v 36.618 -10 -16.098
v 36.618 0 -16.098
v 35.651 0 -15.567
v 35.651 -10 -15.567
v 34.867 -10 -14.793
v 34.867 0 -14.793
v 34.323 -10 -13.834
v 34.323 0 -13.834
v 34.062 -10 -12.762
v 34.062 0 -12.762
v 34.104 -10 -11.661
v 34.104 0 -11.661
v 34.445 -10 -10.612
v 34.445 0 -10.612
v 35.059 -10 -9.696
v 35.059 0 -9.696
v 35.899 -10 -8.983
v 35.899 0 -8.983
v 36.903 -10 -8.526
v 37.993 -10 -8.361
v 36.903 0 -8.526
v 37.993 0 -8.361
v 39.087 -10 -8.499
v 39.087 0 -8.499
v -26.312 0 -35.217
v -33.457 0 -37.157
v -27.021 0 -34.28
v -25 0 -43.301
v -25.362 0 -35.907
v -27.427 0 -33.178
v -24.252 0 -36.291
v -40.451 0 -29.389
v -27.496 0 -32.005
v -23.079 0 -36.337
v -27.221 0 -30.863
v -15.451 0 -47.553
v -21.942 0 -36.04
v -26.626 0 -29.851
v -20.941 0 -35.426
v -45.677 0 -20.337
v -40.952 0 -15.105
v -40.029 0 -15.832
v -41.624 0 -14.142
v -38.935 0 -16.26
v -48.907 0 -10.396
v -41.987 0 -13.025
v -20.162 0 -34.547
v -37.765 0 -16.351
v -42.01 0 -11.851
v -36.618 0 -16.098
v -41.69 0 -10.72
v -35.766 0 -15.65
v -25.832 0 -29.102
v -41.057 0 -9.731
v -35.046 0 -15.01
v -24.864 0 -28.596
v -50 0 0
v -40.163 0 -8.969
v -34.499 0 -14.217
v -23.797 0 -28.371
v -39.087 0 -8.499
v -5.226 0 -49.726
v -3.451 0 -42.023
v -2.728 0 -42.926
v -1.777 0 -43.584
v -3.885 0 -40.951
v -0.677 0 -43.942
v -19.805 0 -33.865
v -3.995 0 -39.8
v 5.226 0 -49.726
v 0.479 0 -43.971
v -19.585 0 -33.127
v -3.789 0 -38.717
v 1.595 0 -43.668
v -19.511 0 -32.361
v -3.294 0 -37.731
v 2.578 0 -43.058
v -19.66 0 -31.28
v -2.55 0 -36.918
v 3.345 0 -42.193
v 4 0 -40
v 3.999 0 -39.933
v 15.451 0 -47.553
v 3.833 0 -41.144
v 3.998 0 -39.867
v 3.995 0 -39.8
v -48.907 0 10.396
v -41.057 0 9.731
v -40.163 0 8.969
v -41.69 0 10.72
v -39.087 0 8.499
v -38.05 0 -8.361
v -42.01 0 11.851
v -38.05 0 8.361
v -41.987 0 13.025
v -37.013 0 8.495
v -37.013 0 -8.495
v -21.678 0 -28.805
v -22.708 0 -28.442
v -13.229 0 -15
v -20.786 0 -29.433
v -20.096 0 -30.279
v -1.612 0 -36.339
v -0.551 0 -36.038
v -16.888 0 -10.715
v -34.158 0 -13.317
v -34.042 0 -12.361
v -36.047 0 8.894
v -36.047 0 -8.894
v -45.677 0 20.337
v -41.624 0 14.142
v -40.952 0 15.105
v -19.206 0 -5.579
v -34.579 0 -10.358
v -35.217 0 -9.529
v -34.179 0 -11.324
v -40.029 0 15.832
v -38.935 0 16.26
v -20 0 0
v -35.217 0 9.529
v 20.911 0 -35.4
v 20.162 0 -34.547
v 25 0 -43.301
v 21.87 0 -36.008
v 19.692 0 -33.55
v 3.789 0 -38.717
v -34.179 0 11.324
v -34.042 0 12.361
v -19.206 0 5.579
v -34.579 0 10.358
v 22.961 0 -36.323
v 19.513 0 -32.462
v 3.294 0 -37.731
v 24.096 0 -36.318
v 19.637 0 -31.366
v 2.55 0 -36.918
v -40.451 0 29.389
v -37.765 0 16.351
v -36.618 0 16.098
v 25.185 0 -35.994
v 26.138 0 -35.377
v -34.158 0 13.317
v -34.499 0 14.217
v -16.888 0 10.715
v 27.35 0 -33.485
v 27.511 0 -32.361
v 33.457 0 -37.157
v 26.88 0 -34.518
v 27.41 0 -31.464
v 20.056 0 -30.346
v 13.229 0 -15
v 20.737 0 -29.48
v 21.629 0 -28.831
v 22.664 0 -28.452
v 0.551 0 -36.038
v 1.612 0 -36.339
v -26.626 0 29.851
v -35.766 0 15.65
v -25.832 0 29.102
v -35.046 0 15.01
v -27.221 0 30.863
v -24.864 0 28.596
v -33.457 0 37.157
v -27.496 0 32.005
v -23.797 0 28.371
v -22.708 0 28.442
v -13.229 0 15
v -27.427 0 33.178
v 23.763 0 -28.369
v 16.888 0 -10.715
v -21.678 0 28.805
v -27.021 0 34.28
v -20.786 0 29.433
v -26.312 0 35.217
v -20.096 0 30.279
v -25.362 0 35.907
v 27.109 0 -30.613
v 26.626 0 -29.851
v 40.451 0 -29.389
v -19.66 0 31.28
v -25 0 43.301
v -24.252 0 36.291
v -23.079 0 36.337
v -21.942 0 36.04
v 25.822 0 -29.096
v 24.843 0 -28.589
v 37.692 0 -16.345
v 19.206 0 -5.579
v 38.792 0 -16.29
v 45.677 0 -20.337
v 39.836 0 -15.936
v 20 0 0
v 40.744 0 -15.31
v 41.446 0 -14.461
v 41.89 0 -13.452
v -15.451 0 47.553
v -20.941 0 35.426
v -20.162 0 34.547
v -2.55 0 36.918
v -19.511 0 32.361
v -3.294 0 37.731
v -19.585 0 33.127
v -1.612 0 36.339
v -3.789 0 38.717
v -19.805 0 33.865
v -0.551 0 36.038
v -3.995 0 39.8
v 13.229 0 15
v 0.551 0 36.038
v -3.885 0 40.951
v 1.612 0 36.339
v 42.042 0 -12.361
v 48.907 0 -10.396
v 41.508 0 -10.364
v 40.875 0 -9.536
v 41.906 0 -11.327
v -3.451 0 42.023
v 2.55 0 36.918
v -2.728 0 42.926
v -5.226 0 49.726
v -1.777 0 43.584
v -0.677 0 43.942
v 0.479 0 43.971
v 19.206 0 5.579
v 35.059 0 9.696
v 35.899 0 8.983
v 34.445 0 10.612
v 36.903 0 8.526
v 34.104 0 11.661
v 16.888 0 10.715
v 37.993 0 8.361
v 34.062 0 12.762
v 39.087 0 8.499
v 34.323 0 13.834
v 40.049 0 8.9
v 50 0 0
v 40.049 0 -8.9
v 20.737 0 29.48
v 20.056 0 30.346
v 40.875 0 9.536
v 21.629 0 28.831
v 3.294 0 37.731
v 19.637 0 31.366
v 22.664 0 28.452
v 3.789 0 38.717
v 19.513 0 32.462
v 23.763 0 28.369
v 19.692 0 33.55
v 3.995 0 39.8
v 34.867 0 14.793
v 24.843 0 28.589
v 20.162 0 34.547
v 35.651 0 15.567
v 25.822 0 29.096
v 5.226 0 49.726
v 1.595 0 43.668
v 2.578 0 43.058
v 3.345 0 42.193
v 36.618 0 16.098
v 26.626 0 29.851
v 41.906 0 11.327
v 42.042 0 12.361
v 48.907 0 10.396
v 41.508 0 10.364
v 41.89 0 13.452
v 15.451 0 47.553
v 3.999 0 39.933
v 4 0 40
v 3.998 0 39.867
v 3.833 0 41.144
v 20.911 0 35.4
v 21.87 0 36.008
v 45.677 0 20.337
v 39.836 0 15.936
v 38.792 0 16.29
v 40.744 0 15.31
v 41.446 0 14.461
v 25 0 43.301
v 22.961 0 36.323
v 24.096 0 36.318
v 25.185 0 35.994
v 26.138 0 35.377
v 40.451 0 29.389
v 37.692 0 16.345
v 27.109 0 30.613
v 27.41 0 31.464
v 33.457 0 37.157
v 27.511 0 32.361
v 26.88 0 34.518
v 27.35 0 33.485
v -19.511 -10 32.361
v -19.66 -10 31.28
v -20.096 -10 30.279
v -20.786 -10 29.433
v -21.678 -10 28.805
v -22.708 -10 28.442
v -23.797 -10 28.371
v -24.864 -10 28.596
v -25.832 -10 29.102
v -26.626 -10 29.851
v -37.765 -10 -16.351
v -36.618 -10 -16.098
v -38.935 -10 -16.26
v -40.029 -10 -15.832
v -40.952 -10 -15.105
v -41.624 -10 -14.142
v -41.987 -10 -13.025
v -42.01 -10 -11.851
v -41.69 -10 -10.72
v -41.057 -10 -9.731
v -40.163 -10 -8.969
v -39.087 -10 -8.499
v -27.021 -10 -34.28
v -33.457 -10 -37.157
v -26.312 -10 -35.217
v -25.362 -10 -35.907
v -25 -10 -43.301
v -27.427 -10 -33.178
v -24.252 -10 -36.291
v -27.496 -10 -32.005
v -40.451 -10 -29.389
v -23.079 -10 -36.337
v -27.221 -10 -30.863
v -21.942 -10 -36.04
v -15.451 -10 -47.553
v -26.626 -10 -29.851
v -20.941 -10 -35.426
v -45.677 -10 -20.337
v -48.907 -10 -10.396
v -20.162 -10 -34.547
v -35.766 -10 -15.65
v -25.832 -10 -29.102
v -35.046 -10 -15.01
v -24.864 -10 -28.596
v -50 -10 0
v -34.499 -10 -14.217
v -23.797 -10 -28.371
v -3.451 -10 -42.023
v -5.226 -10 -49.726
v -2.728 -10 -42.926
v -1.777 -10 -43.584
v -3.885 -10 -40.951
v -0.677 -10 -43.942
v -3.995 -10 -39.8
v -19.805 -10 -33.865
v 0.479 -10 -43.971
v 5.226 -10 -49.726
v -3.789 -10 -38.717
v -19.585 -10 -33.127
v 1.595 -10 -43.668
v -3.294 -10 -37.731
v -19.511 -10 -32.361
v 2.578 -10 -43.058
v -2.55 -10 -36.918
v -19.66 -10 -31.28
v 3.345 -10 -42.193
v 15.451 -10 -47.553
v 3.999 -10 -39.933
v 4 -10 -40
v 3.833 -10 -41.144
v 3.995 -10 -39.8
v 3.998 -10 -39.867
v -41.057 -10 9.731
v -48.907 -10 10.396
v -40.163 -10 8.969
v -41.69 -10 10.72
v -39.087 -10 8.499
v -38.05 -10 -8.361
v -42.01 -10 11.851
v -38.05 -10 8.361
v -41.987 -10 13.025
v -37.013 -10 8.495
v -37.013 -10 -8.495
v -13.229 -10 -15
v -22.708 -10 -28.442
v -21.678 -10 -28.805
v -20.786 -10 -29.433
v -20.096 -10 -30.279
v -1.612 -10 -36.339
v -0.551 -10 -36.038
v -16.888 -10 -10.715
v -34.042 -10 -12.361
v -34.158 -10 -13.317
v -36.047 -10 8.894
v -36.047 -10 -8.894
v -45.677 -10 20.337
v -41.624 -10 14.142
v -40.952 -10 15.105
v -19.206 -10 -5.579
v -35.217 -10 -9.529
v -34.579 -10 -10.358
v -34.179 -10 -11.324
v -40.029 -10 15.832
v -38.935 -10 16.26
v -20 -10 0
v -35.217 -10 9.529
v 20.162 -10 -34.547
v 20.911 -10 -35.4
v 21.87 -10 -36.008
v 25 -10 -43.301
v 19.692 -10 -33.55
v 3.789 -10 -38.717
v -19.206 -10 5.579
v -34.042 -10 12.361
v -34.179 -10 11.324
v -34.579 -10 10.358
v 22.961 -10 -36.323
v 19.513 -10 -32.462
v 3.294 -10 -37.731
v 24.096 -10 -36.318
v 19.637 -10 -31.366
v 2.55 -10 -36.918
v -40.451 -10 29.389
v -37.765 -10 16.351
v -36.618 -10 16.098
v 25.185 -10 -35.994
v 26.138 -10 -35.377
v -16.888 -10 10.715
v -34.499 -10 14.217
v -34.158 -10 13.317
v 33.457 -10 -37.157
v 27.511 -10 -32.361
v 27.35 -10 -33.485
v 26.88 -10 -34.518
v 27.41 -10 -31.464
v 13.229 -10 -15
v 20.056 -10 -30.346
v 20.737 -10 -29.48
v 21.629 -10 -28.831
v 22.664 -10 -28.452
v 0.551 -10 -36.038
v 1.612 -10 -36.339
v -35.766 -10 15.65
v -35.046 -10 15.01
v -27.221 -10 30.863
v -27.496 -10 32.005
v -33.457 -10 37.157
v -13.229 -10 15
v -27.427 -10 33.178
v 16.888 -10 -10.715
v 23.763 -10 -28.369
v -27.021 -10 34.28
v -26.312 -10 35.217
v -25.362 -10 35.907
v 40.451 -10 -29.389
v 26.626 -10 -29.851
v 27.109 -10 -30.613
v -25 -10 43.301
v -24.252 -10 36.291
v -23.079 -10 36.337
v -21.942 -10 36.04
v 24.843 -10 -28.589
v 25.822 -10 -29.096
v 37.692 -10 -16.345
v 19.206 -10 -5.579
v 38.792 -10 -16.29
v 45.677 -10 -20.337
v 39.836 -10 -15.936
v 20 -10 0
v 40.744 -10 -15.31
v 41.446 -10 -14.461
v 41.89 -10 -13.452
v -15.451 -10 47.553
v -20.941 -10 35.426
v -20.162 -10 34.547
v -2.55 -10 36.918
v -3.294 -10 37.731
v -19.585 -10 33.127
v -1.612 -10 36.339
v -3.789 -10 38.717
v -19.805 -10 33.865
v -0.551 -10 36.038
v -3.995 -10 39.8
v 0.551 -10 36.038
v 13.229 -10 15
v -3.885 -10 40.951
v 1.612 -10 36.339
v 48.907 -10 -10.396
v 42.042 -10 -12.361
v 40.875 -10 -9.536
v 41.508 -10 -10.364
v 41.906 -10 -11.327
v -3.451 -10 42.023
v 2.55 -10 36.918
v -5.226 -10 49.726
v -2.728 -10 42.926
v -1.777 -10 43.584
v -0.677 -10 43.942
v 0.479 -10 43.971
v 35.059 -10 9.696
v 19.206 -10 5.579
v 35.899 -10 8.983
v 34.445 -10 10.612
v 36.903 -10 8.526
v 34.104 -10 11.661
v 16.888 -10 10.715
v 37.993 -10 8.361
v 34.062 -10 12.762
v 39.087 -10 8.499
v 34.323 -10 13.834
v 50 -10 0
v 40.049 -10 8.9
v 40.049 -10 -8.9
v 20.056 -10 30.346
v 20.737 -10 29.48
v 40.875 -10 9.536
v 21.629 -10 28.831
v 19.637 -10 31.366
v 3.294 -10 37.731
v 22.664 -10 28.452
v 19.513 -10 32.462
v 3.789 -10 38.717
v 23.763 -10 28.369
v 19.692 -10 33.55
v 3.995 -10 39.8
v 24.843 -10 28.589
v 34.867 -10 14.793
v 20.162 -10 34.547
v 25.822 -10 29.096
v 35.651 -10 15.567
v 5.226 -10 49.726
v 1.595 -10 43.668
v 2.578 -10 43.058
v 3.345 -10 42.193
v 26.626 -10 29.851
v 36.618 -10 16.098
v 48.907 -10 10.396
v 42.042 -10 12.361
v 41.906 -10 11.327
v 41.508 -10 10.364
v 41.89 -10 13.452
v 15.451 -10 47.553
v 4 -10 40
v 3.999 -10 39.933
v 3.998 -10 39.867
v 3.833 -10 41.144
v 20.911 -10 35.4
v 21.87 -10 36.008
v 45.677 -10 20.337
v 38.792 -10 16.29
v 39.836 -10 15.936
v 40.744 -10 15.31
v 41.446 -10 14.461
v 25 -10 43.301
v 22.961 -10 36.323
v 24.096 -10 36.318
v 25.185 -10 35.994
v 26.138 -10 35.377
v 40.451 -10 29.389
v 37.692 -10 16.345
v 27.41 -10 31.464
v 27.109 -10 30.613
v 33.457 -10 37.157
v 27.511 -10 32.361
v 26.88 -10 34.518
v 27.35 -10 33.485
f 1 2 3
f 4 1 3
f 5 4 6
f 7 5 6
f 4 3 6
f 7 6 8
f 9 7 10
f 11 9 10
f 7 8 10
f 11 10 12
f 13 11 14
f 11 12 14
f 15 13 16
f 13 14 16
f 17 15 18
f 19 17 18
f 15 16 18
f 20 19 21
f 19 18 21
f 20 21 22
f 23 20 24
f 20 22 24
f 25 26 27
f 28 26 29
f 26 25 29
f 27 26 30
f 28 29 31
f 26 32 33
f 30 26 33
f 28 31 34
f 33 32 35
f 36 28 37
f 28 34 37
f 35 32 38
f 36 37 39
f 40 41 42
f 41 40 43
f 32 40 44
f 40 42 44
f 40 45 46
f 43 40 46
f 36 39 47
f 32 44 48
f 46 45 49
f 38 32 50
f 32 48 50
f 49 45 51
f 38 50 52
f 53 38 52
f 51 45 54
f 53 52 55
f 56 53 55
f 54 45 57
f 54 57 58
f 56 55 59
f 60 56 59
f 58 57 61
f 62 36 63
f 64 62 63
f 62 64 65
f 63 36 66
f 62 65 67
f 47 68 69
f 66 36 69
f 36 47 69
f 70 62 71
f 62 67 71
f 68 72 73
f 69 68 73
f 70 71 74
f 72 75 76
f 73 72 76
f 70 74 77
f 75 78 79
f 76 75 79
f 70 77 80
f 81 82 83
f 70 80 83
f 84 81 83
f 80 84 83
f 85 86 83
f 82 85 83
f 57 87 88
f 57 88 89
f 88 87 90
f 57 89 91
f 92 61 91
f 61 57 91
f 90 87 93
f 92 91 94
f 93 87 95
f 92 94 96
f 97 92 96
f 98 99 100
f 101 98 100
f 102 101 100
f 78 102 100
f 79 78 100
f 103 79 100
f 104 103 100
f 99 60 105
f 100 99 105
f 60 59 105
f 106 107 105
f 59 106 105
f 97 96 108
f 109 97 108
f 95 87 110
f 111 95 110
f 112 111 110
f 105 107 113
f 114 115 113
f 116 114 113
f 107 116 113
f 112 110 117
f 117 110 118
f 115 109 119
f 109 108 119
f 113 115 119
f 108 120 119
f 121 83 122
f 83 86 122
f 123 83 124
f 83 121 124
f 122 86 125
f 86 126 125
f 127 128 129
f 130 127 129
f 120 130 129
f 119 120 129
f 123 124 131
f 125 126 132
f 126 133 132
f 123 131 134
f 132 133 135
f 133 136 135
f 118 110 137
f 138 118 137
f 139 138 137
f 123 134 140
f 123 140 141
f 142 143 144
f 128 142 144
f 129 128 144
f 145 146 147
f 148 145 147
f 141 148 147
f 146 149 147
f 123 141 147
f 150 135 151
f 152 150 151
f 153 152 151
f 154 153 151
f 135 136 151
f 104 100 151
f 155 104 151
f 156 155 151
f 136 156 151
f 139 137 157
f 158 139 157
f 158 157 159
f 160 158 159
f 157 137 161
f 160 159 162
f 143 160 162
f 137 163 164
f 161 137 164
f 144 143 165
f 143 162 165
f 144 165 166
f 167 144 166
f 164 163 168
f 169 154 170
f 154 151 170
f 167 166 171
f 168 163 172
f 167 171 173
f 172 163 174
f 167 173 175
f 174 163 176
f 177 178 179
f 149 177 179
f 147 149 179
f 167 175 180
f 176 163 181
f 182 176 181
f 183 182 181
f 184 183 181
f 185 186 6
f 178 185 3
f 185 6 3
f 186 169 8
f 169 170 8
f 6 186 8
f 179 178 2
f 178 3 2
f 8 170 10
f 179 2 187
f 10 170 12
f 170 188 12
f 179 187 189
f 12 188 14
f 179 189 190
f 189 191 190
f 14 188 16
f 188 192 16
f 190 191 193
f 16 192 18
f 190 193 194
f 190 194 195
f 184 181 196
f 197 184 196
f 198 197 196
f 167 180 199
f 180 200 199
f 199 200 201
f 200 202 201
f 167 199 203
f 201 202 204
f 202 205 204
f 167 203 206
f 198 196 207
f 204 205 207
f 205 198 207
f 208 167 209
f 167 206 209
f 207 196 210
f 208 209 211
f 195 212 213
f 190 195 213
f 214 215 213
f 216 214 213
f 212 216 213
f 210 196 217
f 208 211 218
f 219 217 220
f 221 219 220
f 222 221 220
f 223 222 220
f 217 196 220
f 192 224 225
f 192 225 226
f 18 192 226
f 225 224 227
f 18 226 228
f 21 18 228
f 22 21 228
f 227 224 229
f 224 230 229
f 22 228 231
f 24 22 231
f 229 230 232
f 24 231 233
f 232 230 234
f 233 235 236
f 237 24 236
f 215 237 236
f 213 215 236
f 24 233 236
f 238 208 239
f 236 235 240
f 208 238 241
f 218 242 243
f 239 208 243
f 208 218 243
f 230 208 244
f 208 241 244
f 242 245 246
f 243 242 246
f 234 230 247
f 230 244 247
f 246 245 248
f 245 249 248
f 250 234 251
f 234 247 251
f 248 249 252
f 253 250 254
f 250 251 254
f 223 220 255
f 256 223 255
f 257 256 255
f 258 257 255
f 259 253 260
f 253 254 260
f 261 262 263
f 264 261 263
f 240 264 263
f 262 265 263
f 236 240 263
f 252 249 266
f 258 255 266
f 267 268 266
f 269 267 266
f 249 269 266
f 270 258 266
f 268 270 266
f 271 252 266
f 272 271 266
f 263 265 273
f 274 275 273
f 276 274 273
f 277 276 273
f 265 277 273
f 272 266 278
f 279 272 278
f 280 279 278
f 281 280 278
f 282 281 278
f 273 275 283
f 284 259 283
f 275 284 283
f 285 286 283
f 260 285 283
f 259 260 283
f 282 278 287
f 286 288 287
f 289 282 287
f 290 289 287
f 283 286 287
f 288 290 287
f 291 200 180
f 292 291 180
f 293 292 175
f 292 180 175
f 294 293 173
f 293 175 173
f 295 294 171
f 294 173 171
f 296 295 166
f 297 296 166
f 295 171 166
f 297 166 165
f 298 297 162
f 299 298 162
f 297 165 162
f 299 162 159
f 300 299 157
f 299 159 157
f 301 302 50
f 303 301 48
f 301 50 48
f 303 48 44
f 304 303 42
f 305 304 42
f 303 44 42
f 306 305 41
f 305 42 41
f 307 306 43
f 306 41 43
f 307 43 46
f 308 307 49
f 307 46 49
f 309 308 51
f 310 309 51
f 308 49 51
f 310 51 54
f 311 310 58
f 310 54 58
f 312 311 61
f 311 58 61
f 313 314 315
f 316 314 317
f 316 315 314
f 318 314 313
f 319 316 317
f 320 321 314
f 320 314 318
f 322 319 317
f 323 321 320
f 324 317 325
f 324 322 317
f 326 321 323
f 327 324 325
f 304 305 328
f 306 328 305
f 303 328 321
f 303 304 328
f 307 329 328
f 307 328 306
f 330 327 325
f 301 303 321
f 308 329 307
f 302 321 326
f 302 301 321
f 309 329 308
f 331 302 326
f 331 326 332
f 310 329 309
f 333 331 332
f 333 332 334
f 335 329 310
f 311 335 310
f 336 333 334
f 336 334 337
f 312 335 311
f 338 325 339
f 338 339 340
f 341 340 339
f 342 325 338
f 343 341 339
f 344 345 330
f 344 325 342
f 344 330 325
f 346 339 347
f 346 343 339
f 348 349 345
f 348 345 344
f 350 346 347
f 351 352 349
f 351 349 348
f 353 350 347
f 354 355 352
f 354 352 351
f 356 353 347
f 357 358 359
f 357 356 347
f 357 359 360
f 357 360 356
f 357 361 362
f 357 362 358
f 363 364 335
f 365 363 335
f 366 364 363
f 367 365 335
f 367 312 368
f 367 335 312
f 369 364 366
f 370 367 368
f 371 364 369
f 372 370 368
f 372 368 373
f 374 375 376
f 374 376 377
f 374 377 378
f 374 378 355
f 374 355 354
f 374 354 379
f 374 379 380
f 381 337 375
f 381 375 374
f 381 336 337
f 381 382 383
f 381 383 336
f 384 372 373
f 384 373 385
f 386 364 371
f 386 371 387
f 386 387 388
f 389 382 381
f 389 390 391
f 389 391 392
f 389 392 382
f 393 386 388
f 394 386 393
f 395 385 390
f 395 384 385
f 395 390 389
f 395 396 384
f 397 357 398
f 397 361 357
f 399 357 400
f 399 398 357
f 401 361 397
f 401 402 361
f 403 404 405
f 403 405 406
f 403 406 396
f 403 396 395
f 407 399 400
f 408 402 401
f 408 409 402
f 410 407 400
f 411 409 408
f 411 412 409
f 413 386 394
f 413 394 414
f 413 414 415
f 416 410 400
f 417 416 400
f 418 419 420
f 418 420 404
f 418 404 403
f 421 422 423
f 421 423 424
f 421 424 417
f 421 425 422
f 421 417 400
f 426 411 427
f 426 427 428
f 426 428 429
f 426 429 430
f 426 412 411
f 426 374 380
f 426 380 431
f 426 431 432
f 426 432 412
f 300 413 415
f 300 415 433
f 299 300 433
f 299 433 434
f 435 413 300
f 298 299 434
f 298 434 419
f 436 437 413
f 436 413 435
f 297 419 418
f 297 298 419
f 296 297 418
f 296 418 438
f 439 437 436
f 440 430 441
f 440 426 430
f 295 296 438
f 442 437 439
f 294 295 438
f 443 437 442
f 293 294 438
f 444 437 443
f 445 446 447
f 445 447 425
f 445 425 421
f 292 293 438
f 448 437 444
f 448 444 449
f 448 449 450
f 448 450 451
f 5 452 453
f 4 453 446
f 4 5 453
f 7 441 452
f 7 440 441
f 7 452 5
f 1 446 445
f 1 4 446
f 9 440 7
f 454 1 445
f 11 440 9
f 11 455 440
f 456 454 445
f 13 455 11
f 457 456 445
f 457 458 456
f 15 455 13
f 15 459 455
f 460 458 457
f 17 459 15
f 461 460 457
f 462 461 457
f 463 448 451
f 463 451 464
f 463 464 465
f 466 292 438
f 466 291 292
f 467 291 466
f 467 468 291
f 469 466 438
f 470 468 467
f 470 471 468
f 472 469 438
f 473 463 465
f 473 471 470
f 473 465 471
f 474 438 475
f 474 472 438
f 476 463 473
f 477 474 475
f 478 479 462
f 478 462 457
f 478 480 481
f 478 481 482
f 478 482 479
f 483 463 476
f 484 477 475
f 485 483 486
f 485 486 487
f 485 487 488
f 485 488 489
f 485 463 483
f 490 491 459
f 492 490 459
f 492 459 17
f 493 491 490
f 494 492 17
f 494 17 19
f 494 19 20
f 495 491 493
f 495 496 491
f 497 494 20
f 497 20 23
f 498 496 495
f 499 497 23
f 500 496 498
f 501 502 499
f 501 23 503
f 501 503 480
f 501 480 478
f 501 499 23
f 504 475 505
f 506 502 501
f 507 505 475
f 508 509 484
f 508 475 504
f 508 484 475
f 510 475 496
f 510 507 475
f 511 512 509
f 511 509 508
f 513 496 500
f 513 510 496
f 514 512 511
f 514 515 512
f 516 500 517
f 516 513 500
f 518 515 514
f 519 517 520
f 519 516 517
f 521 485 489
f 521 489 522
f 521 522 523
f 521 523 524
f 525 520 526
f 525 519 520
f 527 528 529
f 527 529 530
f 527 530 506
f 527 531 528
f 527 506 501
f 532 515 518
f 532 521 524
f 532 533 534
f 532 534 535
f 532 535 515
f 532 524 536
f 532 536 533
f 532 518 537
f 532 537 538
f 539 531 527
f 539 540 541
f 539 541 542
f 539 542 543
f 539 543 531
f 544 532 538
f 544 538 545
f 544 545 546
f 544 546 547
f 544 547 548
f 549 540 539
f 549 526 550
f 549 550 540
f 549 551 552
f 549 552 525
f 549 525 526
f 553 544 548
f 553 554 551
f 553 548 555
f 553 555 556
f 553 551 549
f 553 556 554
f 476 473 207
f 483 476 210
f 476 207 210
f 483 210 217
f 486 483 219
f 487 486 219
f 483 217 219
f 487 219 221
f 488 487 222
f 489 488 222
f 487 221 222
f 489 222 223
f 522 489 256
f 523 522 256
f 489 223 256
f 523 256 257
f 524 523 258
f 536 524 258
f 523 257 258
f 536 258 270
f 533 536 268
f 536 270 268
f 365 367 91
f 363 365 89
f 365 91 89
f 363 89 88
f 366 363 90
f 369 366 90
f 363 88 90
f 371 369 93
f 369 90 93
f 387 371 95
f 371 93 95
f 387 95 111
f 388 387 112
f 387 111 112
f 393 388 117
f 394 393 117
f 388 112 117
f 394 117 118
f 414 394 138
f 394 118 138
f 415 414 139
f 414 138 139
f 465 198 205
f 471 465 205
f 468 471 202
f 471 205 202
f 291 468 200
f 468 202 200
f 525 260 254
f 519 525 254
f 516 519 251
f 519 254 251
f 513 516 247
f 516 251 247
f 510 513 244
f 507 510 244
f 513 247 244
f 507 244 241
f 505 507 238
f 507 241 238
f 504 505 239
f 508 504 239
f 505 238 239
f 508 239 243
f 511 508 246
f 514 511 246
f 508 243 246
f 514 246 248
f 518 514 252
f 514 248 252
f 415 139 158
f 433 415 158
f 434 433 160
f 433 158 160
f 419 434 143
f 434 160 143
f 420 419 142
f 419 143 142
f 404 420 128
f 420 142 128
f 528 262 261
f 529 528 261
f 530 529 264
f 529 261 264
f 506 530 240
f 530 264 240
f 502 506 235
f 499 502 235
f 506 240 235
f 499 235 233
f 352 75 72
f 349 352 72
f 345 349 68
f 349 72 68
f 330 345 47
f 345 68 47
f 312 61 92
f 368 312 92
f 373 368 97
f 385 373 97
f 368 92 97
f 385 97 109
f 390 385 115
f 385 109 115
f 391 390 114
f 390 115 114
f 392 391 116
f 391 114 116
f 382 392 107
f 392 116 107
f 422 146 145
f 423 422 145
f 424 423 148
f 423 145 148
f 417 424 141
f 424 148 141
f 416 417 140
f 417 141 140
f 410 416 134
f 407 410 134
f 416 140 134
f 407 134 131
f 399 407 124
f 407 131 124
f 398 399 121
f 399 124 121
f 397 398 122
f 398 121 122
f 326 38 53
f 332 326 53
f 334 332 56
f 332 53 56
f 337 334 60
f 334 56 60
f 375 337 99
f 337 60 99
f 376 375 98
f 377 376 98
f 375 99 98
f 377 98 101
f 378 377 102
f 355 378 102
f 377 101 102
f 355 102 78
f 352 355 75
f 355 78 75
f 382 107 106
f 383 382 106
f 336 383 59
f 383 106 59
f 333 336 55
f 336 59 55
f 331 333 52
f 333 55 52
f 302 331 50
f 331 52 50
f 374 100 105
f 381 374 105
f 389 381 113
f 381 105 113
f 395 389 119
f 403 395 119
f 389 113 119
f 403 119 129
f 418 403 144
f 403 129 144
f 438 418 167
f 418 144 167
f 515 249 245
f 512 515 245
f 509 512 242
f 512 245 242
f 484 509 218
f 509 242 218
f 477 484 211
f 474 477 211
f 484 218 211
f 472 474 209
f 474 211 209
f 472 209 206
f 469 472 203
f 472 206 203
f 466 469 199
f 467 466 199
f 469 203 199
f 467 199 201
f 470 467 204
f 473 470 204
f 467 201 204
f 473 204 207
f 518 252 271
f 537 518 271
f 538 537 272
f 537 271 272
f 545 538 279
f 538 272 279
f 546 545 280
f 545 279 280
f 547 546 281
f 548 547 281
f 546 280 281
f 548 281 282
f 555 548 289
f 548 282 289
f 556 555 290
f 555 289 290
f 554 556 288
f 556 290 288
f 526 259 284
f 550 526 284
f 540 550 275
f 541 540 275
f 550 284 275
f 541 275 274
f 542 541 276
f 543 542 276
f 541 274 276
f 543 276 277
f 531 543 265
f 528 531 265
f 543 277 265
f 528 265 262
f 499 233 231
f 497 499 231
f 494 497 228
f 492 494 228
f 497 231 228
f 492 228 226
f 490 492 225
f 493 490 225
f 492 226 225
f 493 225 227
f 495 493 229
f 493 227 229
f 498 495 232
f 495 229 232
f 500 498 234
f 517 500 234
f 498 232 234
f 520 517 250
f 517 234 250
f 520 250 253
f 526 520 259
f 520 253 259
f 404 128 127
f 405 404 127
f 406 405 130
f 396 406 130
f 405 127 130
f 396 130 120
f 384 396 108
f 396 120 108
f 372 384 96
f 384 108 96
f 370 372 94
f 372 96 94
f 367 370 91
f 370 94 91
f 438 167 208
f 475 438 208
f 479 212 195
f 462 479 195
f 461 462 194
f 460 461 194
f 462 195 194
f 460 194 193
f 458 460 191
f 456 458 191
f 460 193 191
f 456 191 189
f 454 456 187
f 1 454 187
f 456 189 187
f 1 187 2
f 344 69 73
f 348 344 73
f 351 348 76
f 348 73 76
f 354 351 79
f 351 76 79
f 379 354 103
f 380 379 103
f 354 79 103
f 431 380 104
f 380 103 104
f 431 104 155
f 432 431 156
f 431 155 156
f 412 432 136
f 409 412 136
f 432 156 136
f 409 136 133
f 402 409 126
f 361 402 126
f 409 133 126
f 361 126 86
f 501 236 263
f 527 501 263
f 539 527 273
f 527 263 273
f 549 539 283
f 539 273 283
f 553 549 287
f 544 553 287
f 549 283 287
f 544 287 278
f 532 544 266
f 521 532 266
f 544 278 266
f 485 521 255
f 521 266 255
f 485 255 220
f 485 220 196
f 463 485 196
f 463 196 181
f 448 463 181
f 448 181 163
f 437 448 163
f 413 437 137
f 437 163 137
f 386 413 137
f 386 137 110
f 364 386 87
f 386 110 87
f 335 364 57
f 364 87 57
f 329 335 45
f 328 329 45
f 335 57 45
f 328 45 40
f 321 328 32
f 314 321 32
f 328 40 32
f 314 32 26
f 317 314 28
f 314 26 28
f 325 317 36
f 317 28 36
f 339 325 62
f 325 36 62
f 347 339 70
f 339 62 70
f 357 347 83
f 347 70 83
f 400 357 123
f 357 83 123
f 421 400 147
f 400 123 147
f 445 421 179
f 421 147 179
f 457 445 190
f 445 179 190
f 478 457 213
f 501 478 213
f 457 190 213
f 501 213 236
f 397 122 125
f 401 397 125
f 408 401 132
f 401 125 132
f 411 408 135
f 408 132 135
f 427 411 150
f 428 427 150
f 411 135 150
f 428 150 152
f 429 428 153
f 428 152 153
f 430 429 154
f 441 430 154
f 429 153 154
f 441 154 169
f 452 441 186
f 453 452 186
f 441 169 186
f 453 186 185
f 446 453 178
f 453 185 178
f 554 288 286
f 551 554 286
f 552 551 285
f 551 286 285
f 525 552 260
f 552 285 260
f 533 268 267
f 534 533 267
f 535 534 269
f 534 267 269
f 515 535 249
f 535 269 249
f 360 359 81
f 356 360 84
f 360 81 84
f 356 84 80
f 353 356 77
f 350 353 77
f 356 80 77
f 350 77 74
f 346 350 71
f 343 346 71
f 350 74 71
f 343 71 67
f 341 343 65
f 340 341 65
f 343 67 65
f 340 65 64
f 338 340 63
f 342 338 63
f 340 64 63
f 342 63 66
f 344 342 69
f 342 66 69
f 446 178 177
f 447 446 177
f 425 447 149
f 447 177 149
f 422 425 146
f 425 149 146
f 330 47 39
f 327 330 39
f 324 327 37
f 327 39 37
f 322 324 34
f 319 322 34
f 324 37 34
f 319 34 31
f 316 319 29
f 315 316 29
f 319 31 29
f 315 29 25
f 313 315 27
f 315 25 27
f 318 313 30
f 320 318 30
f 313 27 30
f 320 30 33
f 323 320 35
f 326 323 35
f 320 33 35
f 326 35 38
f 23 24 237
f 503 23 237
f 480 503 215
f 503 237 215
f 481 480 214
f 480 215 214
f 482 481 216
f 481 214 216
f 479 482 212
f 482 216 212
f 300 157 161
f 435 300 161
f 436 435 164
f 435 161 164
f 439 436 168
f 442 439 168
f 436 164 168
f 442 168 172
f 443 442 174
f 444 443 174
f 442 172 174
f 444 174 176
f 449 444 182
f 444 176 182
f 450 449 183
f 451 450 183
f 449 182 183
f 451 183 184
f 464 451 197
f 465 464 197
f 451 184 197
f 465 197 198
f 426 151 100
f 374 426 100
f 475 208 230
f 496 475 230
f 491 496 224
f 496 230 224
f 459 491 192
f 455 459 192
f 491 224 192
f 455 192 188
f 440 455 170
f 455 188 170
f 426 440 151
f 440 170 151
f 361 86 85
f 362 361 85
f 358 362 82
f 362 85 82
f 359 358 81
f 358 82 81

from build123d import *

# Parameters (mm, degrees)
F0_R     = 50
F0_R_2   = 25
F1_DEPTH = 10


with BuildPart() as f1:
    # F0 (on Front) → F1 (new body)
    with BuildSketch(Plane.XZ):
        Circle(F0_R)
        with BuildLine():
            ThreePointArc((-20.1618326801, 34.5470766199), (-12.360679775, 38.0422606518), (-3.9949968711, 39.8))
            ThreePointArc((-3.9949968711, 39.8), (-0.1000312842, 43.9987490222), (4, 40))
            ThreePointArc((4, 40), (3.9987490222, 39.8999687158), (3.9949968711, 39.8))
            ThreePointArc((3.9949968711, 39.8), (12.360679775, 38.0422606518), (20.1618326801, 34.5470766199))
            ThreePointArc((20.1618326801, 34.5470766199), (24.6519560911, 36.1946274563), (27.5114100917, 32.360679775))
            ThreePointArc((27.5114100917, 32.360679775), (27.2835350395, 31.0298629662), (26.6258734024, 29.8506761323))
            ThreePointArc((26.6258734024, 29.8506761323), (32.360679775, 23.5114100917), (36.6175274229, 16.0983441829))
            ThreePointArc((36.6175274229, 16.0983441829), (40.3117393457, 15.6545326038), (42.0422606518, 12.360679775))
            ThreePointArc((42.0422606518, 12.360679775), (41.2185196533, 9.9293470632), (39.0865712742, 8.4994085693))
            ThreePointArc((39.0865712742, 8.4994085693), (40, 0), (39.0865712742, -8.4994085693))
            ThreePointArc((39.0865712742, -8.4994085693), (41.2185196533, -9.9293470632), (42.0422606518, -12.360679775))
            ThreePointArc((42.0422606518, -12.360679775), (40.3117393457, -15.6545326038), (36.6175274229, -16.0983441829))
            ThreePointArc((36.6175274229, -16.0983441829), (32.360679775, -23.5114100917), (26.6258734024, -29.8506761323))
            ThreePointArc((26.6258734024, -29.8506761323), (27.2835350395, -31.0298629662), (27.5114100917, -32.360679775))
            ThreePointArc((27.5114100917, -32.360679775), (24.6519560911, -36.1946274563), (20.1618326801, -34.5470766199))
            ThreePointArc((20.1618326801, -34.5470766199), (12.360679775, -38.0422606518), (3.9949968711, -39.8))
            ThreePointArc((3.9949968711, -39.8), (3.9987490222, -39.8999687158), (4, -40))
            ThreePointArc((4, -40), (-0.1000312842, -43.9987490222), (-3.9949968711, -39.8))
            ThreePointArc((-3.9949968711, -39.8), (-12.360679775, -38.0422606518), (-20.1618326801, -34.5470766199))
            ThreePointArc((-20.1618326801, -34.5470766199), (-25.8625511009, -35.5967477525), (-26.6258734024, -29.8506761323))
            ThreePointArc((-26.6258734024, -29.8506761323), (-32.360679775, -23.5114100917), (-36.6175274229, -16.0983441829))
            ThreePointArc((-36.6175274229, -16.0983441829), (-41.846486717, -13.5967477525), (-39.0865712742, -8.4994085693))
            ThreePointArc((-39.0865712742, -8.4994085693), (-40, 0), (-39.0865712742, 8.4994085693))
            ThreePointArc((-39.0865712742, 8.4994085693), (-41.846486717, 13.5967477525), (-36.6175274229, 16.0983441829))
            ThreePointArc((-36.6175274229, 16.0983441829), (-32.360679775, 23.5114100917), (-26.6258734024, 29.8506761323))
            ThreePointArc((-26.6258734024, 29.8506761323), (-25.8625511009, 35.5967477525), (-20.1618326801, 34.5470766199))
        make_face(mode=Mode.SUBTRACT)
        with BuildLine():
            ThreePointArc((3.9949968711, 39.8), (0, 36), (-3.9949968711, 39.8))
            ThreePointArc((-3.9949968711, 39.8), (-12.360679775, 38.0422606518), (-20.1618326801, 34.5470766199))
            ThreePointArc((-20.1618326801, 34.5470766199), (-19.6774624104, 33.5012257744), (-19.5114100917, 32.360679775))
            ThreePointArc((-19.5114100917, 32.360679775), (-22.1805932829, 28.5885548272), (-26.6258734024, 29.8506761323))
            ThreePointArc((-26.6258734024, 29.8506761323), (-32.360679775, 23.5114100917), (-36.6175274229, 16.0983441829))
            ThreePointArc((-36.6175274229, 16.0983441829), (-34.748407823, 14.6301584689), (-34.0422606518, 12.360679775))
            ThreePointArc((-34.0422606518, 12.360679775), (-35.6109279401, 9.1844207735), (-39.0865712742, 8.4994085693))
            ThreePointArc((-39.0865712742, 8.4994085693), (-40, 0), (-39.0865712742, -8.4994085693))
            ThreePointArc((-39.0865712742, -8.4994085693), (-35.6109279401, -9.1844207735), (-34.0422606518, -12.360679775))
            ThreePointArc((-34.0422606518, -12.360679775), (-34.748407823, -14.6301584689), (-36.6175274229, -16.0983441829))
            ThreePointArc((-36.6175274229, -16.0983441829), (-32.360679775, -23.5114100917), (-26.6258734024, -29.8506761323))
            ThreePointArc((-26.6258734024, -29.8506761323), (-22.1805932829, -28.5885548272), (-19.5114100917, -32.360679775))
            ThreePointArc((-19.5114100917, -32.360679775), (-19.6774624104, -33.5012257744), (-20.1618326801, -34.5470766199))
            ThreePointArc((-20.1618326801, -34.5470766199), (-12.360679775, -38.0422606518), (-3.9949968711, -39.8))
            ThreePointArc((-3.9949968711, -39.8), (0, -36), (3.9949968711, -39.8))
            ThreePointArc((3.9949968711, -39.8), (12.360679775, -38.0422606518), (20.1618326801, -34.5470766199))
            ThreePointArc((20.1618326801, -34.5470766199), (21.1602690825, -29.1246117975), (26.6258734024, -29.8506761323))
            ThreePointArc((26.6258734024, -29.8506761323), (32.360679775, -23.5114100917), (36.6175274229, -16.0983441829))
            ThreePointArc((36.6175274229, -16.0983441829), (34.2380345866, -11.1246117975), (39.0865712742, -8.4994085693))
            ThreePointArc((39.0865712742, -8.4994085693), (40, 0), (39.0865712742, 8.4994085693))
            ThreePointArc((39.0865712742, 8.4994085693), (34.2380345866, 11.1246117975), (36.6175274229, 16.0983441829))
            ThreePointArc((36.6175274229, 16.0983441829), (32.360679775, 23.5114100917), (26.6258734024, 29.8506761323))
            ThreePointArc((26.6258734024, 29.8506761323), (21.1602690825, 29.1246117975), (20.1618326801, 34.5470766199))
            ThreePointArc((20.1618326801, 34.5470766199), (12.360679775, 38.0422606518), (3.9949968711, 39.8))
        make_face()
        Circle(F0_R_2, mode=Mode.SUBTRACT)
        Circle(F0_R_2)
        with BuildLine():
            ThreePointArc((-13.2287565553, -15), (-20, 0), (-13.2287565553, 15))
            Line((-13.2287565553, 15), (13.2287565553, 15))
            ThreePointArc((13.2287565553, 15), (20, 0), (13.2287565553, -15))
            Line((13.2287565553, -15), (-13.2287565553, -15))
        make_face(mode=Mode.SUBTRACT)
    extrude(amount=F1_DEPTH)


solid = f1.part
